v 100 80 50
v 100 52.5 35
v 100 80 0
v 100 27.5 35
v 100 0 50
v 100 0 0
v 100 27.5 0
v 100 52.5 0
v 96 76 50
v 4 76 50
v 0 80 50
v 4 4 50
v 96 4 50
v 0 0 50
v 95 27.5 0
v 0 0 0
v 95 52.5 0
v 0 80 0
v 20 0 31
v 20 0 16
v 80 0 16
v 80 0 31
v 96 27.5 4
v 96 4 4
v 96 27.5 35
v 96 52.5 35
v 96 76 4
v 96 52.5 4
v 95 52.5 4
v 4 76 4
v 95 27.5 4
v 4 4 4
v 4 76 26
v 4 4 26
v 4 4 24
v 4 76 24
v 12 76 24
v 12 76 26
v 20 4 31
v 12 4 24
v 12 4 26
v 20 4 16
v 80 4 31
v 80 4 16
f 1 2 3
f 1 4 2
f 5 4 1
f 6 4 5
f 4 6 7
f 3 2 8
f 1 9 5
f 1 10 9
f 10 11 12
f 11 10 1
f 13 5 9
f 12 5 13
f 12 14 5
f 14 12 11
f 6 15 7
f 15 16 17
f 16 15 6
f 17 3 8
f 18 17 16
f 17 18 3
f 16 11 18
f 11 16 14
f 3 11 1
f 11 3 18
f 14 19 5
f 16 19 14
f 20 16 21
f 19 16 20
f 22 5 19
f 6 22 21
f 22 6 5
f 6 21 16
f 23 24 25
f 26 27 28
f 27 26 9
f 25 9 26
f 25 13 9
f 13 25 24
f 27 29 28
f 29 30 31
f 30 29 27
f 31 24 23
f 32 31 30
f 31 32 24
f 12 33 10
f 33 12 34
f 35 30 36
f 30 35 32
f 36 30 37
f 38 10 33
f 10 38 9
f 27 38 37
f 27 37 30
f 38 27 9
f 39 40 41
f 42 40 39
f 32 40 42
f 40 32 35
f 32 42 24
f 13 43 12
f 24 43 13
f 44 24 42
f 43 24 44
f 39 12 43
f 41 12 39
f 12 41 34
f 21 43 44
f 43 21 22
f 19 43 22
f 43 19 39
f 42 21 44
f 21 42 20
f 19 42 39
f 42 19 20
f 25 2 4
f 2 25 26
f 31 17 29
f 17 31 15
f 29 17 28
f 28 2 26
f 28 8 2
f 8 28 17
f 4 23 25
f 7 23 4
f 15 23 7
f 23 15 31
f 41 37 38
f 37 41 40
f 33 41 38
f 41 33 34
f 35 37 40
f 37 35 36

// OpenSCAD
// Parameters
box_width = 100;
box_depth = 80;
box_height = 50;
wall_thickness = 4;
floor_thickness = 4;

// Horizontal cut parameters (Front face)
horiz_cut_width = 60;
horiz_cut_height = 15;
horiz_cut_z_offset = 12;

// Vertical cut parameters (Right face)
vert_cut_width = 25;
vert_cut_height = 35;

// Internal ledge parameters (Left face)
ledge_width = 8;
ledge_thickness = 2;
ledge_z_offset = 20;

$fn = 100;

// Main enclosure module
module enclosure() {
    union() {
        difference() {
            // Main outer body
            cube([box_width, box_depth, box_height]);
            
            // Hollow interior creating the open top and wall rim
            translate([wall_thickness, wall_thickness, floor_thickness])
                cube([box_width - 2 * wall_thickness, box_depth - 2 * wall_thickness, box_height]);
                
            // Centered horizontal rectangular opening on the front side (y = 0)
            // Positioned above the lower edge
            translate([(box_width - horiz_cut_width) / 2, -1, floor_thickness + horiz_cut_z_offset])
                cube([horiz_cut_width, wall_thickness + 2, horiz_cut_height]);
                
            // Taller vertical through opening on the adjacent right side (x = box_width)
            // Rising from the underside region
            translate([box_width - wall_thickness - 1, (box_depth - vert_cut_width) / 2, -1])
                cube([wall_thickness + 2, vert_cut_width, vert_cut_height + 1]);
        }
        
        // Thin solid ledge/shelf-like rib along the inside left wall
        translate([wall_thickness, wall_thickness, floor_thickness + ledge_z_offset])
            cube([ledge_width, box_depth - 2 * wall_thickness, ledge_thickness]);
    }
}

// Generate the model
enclosure();
